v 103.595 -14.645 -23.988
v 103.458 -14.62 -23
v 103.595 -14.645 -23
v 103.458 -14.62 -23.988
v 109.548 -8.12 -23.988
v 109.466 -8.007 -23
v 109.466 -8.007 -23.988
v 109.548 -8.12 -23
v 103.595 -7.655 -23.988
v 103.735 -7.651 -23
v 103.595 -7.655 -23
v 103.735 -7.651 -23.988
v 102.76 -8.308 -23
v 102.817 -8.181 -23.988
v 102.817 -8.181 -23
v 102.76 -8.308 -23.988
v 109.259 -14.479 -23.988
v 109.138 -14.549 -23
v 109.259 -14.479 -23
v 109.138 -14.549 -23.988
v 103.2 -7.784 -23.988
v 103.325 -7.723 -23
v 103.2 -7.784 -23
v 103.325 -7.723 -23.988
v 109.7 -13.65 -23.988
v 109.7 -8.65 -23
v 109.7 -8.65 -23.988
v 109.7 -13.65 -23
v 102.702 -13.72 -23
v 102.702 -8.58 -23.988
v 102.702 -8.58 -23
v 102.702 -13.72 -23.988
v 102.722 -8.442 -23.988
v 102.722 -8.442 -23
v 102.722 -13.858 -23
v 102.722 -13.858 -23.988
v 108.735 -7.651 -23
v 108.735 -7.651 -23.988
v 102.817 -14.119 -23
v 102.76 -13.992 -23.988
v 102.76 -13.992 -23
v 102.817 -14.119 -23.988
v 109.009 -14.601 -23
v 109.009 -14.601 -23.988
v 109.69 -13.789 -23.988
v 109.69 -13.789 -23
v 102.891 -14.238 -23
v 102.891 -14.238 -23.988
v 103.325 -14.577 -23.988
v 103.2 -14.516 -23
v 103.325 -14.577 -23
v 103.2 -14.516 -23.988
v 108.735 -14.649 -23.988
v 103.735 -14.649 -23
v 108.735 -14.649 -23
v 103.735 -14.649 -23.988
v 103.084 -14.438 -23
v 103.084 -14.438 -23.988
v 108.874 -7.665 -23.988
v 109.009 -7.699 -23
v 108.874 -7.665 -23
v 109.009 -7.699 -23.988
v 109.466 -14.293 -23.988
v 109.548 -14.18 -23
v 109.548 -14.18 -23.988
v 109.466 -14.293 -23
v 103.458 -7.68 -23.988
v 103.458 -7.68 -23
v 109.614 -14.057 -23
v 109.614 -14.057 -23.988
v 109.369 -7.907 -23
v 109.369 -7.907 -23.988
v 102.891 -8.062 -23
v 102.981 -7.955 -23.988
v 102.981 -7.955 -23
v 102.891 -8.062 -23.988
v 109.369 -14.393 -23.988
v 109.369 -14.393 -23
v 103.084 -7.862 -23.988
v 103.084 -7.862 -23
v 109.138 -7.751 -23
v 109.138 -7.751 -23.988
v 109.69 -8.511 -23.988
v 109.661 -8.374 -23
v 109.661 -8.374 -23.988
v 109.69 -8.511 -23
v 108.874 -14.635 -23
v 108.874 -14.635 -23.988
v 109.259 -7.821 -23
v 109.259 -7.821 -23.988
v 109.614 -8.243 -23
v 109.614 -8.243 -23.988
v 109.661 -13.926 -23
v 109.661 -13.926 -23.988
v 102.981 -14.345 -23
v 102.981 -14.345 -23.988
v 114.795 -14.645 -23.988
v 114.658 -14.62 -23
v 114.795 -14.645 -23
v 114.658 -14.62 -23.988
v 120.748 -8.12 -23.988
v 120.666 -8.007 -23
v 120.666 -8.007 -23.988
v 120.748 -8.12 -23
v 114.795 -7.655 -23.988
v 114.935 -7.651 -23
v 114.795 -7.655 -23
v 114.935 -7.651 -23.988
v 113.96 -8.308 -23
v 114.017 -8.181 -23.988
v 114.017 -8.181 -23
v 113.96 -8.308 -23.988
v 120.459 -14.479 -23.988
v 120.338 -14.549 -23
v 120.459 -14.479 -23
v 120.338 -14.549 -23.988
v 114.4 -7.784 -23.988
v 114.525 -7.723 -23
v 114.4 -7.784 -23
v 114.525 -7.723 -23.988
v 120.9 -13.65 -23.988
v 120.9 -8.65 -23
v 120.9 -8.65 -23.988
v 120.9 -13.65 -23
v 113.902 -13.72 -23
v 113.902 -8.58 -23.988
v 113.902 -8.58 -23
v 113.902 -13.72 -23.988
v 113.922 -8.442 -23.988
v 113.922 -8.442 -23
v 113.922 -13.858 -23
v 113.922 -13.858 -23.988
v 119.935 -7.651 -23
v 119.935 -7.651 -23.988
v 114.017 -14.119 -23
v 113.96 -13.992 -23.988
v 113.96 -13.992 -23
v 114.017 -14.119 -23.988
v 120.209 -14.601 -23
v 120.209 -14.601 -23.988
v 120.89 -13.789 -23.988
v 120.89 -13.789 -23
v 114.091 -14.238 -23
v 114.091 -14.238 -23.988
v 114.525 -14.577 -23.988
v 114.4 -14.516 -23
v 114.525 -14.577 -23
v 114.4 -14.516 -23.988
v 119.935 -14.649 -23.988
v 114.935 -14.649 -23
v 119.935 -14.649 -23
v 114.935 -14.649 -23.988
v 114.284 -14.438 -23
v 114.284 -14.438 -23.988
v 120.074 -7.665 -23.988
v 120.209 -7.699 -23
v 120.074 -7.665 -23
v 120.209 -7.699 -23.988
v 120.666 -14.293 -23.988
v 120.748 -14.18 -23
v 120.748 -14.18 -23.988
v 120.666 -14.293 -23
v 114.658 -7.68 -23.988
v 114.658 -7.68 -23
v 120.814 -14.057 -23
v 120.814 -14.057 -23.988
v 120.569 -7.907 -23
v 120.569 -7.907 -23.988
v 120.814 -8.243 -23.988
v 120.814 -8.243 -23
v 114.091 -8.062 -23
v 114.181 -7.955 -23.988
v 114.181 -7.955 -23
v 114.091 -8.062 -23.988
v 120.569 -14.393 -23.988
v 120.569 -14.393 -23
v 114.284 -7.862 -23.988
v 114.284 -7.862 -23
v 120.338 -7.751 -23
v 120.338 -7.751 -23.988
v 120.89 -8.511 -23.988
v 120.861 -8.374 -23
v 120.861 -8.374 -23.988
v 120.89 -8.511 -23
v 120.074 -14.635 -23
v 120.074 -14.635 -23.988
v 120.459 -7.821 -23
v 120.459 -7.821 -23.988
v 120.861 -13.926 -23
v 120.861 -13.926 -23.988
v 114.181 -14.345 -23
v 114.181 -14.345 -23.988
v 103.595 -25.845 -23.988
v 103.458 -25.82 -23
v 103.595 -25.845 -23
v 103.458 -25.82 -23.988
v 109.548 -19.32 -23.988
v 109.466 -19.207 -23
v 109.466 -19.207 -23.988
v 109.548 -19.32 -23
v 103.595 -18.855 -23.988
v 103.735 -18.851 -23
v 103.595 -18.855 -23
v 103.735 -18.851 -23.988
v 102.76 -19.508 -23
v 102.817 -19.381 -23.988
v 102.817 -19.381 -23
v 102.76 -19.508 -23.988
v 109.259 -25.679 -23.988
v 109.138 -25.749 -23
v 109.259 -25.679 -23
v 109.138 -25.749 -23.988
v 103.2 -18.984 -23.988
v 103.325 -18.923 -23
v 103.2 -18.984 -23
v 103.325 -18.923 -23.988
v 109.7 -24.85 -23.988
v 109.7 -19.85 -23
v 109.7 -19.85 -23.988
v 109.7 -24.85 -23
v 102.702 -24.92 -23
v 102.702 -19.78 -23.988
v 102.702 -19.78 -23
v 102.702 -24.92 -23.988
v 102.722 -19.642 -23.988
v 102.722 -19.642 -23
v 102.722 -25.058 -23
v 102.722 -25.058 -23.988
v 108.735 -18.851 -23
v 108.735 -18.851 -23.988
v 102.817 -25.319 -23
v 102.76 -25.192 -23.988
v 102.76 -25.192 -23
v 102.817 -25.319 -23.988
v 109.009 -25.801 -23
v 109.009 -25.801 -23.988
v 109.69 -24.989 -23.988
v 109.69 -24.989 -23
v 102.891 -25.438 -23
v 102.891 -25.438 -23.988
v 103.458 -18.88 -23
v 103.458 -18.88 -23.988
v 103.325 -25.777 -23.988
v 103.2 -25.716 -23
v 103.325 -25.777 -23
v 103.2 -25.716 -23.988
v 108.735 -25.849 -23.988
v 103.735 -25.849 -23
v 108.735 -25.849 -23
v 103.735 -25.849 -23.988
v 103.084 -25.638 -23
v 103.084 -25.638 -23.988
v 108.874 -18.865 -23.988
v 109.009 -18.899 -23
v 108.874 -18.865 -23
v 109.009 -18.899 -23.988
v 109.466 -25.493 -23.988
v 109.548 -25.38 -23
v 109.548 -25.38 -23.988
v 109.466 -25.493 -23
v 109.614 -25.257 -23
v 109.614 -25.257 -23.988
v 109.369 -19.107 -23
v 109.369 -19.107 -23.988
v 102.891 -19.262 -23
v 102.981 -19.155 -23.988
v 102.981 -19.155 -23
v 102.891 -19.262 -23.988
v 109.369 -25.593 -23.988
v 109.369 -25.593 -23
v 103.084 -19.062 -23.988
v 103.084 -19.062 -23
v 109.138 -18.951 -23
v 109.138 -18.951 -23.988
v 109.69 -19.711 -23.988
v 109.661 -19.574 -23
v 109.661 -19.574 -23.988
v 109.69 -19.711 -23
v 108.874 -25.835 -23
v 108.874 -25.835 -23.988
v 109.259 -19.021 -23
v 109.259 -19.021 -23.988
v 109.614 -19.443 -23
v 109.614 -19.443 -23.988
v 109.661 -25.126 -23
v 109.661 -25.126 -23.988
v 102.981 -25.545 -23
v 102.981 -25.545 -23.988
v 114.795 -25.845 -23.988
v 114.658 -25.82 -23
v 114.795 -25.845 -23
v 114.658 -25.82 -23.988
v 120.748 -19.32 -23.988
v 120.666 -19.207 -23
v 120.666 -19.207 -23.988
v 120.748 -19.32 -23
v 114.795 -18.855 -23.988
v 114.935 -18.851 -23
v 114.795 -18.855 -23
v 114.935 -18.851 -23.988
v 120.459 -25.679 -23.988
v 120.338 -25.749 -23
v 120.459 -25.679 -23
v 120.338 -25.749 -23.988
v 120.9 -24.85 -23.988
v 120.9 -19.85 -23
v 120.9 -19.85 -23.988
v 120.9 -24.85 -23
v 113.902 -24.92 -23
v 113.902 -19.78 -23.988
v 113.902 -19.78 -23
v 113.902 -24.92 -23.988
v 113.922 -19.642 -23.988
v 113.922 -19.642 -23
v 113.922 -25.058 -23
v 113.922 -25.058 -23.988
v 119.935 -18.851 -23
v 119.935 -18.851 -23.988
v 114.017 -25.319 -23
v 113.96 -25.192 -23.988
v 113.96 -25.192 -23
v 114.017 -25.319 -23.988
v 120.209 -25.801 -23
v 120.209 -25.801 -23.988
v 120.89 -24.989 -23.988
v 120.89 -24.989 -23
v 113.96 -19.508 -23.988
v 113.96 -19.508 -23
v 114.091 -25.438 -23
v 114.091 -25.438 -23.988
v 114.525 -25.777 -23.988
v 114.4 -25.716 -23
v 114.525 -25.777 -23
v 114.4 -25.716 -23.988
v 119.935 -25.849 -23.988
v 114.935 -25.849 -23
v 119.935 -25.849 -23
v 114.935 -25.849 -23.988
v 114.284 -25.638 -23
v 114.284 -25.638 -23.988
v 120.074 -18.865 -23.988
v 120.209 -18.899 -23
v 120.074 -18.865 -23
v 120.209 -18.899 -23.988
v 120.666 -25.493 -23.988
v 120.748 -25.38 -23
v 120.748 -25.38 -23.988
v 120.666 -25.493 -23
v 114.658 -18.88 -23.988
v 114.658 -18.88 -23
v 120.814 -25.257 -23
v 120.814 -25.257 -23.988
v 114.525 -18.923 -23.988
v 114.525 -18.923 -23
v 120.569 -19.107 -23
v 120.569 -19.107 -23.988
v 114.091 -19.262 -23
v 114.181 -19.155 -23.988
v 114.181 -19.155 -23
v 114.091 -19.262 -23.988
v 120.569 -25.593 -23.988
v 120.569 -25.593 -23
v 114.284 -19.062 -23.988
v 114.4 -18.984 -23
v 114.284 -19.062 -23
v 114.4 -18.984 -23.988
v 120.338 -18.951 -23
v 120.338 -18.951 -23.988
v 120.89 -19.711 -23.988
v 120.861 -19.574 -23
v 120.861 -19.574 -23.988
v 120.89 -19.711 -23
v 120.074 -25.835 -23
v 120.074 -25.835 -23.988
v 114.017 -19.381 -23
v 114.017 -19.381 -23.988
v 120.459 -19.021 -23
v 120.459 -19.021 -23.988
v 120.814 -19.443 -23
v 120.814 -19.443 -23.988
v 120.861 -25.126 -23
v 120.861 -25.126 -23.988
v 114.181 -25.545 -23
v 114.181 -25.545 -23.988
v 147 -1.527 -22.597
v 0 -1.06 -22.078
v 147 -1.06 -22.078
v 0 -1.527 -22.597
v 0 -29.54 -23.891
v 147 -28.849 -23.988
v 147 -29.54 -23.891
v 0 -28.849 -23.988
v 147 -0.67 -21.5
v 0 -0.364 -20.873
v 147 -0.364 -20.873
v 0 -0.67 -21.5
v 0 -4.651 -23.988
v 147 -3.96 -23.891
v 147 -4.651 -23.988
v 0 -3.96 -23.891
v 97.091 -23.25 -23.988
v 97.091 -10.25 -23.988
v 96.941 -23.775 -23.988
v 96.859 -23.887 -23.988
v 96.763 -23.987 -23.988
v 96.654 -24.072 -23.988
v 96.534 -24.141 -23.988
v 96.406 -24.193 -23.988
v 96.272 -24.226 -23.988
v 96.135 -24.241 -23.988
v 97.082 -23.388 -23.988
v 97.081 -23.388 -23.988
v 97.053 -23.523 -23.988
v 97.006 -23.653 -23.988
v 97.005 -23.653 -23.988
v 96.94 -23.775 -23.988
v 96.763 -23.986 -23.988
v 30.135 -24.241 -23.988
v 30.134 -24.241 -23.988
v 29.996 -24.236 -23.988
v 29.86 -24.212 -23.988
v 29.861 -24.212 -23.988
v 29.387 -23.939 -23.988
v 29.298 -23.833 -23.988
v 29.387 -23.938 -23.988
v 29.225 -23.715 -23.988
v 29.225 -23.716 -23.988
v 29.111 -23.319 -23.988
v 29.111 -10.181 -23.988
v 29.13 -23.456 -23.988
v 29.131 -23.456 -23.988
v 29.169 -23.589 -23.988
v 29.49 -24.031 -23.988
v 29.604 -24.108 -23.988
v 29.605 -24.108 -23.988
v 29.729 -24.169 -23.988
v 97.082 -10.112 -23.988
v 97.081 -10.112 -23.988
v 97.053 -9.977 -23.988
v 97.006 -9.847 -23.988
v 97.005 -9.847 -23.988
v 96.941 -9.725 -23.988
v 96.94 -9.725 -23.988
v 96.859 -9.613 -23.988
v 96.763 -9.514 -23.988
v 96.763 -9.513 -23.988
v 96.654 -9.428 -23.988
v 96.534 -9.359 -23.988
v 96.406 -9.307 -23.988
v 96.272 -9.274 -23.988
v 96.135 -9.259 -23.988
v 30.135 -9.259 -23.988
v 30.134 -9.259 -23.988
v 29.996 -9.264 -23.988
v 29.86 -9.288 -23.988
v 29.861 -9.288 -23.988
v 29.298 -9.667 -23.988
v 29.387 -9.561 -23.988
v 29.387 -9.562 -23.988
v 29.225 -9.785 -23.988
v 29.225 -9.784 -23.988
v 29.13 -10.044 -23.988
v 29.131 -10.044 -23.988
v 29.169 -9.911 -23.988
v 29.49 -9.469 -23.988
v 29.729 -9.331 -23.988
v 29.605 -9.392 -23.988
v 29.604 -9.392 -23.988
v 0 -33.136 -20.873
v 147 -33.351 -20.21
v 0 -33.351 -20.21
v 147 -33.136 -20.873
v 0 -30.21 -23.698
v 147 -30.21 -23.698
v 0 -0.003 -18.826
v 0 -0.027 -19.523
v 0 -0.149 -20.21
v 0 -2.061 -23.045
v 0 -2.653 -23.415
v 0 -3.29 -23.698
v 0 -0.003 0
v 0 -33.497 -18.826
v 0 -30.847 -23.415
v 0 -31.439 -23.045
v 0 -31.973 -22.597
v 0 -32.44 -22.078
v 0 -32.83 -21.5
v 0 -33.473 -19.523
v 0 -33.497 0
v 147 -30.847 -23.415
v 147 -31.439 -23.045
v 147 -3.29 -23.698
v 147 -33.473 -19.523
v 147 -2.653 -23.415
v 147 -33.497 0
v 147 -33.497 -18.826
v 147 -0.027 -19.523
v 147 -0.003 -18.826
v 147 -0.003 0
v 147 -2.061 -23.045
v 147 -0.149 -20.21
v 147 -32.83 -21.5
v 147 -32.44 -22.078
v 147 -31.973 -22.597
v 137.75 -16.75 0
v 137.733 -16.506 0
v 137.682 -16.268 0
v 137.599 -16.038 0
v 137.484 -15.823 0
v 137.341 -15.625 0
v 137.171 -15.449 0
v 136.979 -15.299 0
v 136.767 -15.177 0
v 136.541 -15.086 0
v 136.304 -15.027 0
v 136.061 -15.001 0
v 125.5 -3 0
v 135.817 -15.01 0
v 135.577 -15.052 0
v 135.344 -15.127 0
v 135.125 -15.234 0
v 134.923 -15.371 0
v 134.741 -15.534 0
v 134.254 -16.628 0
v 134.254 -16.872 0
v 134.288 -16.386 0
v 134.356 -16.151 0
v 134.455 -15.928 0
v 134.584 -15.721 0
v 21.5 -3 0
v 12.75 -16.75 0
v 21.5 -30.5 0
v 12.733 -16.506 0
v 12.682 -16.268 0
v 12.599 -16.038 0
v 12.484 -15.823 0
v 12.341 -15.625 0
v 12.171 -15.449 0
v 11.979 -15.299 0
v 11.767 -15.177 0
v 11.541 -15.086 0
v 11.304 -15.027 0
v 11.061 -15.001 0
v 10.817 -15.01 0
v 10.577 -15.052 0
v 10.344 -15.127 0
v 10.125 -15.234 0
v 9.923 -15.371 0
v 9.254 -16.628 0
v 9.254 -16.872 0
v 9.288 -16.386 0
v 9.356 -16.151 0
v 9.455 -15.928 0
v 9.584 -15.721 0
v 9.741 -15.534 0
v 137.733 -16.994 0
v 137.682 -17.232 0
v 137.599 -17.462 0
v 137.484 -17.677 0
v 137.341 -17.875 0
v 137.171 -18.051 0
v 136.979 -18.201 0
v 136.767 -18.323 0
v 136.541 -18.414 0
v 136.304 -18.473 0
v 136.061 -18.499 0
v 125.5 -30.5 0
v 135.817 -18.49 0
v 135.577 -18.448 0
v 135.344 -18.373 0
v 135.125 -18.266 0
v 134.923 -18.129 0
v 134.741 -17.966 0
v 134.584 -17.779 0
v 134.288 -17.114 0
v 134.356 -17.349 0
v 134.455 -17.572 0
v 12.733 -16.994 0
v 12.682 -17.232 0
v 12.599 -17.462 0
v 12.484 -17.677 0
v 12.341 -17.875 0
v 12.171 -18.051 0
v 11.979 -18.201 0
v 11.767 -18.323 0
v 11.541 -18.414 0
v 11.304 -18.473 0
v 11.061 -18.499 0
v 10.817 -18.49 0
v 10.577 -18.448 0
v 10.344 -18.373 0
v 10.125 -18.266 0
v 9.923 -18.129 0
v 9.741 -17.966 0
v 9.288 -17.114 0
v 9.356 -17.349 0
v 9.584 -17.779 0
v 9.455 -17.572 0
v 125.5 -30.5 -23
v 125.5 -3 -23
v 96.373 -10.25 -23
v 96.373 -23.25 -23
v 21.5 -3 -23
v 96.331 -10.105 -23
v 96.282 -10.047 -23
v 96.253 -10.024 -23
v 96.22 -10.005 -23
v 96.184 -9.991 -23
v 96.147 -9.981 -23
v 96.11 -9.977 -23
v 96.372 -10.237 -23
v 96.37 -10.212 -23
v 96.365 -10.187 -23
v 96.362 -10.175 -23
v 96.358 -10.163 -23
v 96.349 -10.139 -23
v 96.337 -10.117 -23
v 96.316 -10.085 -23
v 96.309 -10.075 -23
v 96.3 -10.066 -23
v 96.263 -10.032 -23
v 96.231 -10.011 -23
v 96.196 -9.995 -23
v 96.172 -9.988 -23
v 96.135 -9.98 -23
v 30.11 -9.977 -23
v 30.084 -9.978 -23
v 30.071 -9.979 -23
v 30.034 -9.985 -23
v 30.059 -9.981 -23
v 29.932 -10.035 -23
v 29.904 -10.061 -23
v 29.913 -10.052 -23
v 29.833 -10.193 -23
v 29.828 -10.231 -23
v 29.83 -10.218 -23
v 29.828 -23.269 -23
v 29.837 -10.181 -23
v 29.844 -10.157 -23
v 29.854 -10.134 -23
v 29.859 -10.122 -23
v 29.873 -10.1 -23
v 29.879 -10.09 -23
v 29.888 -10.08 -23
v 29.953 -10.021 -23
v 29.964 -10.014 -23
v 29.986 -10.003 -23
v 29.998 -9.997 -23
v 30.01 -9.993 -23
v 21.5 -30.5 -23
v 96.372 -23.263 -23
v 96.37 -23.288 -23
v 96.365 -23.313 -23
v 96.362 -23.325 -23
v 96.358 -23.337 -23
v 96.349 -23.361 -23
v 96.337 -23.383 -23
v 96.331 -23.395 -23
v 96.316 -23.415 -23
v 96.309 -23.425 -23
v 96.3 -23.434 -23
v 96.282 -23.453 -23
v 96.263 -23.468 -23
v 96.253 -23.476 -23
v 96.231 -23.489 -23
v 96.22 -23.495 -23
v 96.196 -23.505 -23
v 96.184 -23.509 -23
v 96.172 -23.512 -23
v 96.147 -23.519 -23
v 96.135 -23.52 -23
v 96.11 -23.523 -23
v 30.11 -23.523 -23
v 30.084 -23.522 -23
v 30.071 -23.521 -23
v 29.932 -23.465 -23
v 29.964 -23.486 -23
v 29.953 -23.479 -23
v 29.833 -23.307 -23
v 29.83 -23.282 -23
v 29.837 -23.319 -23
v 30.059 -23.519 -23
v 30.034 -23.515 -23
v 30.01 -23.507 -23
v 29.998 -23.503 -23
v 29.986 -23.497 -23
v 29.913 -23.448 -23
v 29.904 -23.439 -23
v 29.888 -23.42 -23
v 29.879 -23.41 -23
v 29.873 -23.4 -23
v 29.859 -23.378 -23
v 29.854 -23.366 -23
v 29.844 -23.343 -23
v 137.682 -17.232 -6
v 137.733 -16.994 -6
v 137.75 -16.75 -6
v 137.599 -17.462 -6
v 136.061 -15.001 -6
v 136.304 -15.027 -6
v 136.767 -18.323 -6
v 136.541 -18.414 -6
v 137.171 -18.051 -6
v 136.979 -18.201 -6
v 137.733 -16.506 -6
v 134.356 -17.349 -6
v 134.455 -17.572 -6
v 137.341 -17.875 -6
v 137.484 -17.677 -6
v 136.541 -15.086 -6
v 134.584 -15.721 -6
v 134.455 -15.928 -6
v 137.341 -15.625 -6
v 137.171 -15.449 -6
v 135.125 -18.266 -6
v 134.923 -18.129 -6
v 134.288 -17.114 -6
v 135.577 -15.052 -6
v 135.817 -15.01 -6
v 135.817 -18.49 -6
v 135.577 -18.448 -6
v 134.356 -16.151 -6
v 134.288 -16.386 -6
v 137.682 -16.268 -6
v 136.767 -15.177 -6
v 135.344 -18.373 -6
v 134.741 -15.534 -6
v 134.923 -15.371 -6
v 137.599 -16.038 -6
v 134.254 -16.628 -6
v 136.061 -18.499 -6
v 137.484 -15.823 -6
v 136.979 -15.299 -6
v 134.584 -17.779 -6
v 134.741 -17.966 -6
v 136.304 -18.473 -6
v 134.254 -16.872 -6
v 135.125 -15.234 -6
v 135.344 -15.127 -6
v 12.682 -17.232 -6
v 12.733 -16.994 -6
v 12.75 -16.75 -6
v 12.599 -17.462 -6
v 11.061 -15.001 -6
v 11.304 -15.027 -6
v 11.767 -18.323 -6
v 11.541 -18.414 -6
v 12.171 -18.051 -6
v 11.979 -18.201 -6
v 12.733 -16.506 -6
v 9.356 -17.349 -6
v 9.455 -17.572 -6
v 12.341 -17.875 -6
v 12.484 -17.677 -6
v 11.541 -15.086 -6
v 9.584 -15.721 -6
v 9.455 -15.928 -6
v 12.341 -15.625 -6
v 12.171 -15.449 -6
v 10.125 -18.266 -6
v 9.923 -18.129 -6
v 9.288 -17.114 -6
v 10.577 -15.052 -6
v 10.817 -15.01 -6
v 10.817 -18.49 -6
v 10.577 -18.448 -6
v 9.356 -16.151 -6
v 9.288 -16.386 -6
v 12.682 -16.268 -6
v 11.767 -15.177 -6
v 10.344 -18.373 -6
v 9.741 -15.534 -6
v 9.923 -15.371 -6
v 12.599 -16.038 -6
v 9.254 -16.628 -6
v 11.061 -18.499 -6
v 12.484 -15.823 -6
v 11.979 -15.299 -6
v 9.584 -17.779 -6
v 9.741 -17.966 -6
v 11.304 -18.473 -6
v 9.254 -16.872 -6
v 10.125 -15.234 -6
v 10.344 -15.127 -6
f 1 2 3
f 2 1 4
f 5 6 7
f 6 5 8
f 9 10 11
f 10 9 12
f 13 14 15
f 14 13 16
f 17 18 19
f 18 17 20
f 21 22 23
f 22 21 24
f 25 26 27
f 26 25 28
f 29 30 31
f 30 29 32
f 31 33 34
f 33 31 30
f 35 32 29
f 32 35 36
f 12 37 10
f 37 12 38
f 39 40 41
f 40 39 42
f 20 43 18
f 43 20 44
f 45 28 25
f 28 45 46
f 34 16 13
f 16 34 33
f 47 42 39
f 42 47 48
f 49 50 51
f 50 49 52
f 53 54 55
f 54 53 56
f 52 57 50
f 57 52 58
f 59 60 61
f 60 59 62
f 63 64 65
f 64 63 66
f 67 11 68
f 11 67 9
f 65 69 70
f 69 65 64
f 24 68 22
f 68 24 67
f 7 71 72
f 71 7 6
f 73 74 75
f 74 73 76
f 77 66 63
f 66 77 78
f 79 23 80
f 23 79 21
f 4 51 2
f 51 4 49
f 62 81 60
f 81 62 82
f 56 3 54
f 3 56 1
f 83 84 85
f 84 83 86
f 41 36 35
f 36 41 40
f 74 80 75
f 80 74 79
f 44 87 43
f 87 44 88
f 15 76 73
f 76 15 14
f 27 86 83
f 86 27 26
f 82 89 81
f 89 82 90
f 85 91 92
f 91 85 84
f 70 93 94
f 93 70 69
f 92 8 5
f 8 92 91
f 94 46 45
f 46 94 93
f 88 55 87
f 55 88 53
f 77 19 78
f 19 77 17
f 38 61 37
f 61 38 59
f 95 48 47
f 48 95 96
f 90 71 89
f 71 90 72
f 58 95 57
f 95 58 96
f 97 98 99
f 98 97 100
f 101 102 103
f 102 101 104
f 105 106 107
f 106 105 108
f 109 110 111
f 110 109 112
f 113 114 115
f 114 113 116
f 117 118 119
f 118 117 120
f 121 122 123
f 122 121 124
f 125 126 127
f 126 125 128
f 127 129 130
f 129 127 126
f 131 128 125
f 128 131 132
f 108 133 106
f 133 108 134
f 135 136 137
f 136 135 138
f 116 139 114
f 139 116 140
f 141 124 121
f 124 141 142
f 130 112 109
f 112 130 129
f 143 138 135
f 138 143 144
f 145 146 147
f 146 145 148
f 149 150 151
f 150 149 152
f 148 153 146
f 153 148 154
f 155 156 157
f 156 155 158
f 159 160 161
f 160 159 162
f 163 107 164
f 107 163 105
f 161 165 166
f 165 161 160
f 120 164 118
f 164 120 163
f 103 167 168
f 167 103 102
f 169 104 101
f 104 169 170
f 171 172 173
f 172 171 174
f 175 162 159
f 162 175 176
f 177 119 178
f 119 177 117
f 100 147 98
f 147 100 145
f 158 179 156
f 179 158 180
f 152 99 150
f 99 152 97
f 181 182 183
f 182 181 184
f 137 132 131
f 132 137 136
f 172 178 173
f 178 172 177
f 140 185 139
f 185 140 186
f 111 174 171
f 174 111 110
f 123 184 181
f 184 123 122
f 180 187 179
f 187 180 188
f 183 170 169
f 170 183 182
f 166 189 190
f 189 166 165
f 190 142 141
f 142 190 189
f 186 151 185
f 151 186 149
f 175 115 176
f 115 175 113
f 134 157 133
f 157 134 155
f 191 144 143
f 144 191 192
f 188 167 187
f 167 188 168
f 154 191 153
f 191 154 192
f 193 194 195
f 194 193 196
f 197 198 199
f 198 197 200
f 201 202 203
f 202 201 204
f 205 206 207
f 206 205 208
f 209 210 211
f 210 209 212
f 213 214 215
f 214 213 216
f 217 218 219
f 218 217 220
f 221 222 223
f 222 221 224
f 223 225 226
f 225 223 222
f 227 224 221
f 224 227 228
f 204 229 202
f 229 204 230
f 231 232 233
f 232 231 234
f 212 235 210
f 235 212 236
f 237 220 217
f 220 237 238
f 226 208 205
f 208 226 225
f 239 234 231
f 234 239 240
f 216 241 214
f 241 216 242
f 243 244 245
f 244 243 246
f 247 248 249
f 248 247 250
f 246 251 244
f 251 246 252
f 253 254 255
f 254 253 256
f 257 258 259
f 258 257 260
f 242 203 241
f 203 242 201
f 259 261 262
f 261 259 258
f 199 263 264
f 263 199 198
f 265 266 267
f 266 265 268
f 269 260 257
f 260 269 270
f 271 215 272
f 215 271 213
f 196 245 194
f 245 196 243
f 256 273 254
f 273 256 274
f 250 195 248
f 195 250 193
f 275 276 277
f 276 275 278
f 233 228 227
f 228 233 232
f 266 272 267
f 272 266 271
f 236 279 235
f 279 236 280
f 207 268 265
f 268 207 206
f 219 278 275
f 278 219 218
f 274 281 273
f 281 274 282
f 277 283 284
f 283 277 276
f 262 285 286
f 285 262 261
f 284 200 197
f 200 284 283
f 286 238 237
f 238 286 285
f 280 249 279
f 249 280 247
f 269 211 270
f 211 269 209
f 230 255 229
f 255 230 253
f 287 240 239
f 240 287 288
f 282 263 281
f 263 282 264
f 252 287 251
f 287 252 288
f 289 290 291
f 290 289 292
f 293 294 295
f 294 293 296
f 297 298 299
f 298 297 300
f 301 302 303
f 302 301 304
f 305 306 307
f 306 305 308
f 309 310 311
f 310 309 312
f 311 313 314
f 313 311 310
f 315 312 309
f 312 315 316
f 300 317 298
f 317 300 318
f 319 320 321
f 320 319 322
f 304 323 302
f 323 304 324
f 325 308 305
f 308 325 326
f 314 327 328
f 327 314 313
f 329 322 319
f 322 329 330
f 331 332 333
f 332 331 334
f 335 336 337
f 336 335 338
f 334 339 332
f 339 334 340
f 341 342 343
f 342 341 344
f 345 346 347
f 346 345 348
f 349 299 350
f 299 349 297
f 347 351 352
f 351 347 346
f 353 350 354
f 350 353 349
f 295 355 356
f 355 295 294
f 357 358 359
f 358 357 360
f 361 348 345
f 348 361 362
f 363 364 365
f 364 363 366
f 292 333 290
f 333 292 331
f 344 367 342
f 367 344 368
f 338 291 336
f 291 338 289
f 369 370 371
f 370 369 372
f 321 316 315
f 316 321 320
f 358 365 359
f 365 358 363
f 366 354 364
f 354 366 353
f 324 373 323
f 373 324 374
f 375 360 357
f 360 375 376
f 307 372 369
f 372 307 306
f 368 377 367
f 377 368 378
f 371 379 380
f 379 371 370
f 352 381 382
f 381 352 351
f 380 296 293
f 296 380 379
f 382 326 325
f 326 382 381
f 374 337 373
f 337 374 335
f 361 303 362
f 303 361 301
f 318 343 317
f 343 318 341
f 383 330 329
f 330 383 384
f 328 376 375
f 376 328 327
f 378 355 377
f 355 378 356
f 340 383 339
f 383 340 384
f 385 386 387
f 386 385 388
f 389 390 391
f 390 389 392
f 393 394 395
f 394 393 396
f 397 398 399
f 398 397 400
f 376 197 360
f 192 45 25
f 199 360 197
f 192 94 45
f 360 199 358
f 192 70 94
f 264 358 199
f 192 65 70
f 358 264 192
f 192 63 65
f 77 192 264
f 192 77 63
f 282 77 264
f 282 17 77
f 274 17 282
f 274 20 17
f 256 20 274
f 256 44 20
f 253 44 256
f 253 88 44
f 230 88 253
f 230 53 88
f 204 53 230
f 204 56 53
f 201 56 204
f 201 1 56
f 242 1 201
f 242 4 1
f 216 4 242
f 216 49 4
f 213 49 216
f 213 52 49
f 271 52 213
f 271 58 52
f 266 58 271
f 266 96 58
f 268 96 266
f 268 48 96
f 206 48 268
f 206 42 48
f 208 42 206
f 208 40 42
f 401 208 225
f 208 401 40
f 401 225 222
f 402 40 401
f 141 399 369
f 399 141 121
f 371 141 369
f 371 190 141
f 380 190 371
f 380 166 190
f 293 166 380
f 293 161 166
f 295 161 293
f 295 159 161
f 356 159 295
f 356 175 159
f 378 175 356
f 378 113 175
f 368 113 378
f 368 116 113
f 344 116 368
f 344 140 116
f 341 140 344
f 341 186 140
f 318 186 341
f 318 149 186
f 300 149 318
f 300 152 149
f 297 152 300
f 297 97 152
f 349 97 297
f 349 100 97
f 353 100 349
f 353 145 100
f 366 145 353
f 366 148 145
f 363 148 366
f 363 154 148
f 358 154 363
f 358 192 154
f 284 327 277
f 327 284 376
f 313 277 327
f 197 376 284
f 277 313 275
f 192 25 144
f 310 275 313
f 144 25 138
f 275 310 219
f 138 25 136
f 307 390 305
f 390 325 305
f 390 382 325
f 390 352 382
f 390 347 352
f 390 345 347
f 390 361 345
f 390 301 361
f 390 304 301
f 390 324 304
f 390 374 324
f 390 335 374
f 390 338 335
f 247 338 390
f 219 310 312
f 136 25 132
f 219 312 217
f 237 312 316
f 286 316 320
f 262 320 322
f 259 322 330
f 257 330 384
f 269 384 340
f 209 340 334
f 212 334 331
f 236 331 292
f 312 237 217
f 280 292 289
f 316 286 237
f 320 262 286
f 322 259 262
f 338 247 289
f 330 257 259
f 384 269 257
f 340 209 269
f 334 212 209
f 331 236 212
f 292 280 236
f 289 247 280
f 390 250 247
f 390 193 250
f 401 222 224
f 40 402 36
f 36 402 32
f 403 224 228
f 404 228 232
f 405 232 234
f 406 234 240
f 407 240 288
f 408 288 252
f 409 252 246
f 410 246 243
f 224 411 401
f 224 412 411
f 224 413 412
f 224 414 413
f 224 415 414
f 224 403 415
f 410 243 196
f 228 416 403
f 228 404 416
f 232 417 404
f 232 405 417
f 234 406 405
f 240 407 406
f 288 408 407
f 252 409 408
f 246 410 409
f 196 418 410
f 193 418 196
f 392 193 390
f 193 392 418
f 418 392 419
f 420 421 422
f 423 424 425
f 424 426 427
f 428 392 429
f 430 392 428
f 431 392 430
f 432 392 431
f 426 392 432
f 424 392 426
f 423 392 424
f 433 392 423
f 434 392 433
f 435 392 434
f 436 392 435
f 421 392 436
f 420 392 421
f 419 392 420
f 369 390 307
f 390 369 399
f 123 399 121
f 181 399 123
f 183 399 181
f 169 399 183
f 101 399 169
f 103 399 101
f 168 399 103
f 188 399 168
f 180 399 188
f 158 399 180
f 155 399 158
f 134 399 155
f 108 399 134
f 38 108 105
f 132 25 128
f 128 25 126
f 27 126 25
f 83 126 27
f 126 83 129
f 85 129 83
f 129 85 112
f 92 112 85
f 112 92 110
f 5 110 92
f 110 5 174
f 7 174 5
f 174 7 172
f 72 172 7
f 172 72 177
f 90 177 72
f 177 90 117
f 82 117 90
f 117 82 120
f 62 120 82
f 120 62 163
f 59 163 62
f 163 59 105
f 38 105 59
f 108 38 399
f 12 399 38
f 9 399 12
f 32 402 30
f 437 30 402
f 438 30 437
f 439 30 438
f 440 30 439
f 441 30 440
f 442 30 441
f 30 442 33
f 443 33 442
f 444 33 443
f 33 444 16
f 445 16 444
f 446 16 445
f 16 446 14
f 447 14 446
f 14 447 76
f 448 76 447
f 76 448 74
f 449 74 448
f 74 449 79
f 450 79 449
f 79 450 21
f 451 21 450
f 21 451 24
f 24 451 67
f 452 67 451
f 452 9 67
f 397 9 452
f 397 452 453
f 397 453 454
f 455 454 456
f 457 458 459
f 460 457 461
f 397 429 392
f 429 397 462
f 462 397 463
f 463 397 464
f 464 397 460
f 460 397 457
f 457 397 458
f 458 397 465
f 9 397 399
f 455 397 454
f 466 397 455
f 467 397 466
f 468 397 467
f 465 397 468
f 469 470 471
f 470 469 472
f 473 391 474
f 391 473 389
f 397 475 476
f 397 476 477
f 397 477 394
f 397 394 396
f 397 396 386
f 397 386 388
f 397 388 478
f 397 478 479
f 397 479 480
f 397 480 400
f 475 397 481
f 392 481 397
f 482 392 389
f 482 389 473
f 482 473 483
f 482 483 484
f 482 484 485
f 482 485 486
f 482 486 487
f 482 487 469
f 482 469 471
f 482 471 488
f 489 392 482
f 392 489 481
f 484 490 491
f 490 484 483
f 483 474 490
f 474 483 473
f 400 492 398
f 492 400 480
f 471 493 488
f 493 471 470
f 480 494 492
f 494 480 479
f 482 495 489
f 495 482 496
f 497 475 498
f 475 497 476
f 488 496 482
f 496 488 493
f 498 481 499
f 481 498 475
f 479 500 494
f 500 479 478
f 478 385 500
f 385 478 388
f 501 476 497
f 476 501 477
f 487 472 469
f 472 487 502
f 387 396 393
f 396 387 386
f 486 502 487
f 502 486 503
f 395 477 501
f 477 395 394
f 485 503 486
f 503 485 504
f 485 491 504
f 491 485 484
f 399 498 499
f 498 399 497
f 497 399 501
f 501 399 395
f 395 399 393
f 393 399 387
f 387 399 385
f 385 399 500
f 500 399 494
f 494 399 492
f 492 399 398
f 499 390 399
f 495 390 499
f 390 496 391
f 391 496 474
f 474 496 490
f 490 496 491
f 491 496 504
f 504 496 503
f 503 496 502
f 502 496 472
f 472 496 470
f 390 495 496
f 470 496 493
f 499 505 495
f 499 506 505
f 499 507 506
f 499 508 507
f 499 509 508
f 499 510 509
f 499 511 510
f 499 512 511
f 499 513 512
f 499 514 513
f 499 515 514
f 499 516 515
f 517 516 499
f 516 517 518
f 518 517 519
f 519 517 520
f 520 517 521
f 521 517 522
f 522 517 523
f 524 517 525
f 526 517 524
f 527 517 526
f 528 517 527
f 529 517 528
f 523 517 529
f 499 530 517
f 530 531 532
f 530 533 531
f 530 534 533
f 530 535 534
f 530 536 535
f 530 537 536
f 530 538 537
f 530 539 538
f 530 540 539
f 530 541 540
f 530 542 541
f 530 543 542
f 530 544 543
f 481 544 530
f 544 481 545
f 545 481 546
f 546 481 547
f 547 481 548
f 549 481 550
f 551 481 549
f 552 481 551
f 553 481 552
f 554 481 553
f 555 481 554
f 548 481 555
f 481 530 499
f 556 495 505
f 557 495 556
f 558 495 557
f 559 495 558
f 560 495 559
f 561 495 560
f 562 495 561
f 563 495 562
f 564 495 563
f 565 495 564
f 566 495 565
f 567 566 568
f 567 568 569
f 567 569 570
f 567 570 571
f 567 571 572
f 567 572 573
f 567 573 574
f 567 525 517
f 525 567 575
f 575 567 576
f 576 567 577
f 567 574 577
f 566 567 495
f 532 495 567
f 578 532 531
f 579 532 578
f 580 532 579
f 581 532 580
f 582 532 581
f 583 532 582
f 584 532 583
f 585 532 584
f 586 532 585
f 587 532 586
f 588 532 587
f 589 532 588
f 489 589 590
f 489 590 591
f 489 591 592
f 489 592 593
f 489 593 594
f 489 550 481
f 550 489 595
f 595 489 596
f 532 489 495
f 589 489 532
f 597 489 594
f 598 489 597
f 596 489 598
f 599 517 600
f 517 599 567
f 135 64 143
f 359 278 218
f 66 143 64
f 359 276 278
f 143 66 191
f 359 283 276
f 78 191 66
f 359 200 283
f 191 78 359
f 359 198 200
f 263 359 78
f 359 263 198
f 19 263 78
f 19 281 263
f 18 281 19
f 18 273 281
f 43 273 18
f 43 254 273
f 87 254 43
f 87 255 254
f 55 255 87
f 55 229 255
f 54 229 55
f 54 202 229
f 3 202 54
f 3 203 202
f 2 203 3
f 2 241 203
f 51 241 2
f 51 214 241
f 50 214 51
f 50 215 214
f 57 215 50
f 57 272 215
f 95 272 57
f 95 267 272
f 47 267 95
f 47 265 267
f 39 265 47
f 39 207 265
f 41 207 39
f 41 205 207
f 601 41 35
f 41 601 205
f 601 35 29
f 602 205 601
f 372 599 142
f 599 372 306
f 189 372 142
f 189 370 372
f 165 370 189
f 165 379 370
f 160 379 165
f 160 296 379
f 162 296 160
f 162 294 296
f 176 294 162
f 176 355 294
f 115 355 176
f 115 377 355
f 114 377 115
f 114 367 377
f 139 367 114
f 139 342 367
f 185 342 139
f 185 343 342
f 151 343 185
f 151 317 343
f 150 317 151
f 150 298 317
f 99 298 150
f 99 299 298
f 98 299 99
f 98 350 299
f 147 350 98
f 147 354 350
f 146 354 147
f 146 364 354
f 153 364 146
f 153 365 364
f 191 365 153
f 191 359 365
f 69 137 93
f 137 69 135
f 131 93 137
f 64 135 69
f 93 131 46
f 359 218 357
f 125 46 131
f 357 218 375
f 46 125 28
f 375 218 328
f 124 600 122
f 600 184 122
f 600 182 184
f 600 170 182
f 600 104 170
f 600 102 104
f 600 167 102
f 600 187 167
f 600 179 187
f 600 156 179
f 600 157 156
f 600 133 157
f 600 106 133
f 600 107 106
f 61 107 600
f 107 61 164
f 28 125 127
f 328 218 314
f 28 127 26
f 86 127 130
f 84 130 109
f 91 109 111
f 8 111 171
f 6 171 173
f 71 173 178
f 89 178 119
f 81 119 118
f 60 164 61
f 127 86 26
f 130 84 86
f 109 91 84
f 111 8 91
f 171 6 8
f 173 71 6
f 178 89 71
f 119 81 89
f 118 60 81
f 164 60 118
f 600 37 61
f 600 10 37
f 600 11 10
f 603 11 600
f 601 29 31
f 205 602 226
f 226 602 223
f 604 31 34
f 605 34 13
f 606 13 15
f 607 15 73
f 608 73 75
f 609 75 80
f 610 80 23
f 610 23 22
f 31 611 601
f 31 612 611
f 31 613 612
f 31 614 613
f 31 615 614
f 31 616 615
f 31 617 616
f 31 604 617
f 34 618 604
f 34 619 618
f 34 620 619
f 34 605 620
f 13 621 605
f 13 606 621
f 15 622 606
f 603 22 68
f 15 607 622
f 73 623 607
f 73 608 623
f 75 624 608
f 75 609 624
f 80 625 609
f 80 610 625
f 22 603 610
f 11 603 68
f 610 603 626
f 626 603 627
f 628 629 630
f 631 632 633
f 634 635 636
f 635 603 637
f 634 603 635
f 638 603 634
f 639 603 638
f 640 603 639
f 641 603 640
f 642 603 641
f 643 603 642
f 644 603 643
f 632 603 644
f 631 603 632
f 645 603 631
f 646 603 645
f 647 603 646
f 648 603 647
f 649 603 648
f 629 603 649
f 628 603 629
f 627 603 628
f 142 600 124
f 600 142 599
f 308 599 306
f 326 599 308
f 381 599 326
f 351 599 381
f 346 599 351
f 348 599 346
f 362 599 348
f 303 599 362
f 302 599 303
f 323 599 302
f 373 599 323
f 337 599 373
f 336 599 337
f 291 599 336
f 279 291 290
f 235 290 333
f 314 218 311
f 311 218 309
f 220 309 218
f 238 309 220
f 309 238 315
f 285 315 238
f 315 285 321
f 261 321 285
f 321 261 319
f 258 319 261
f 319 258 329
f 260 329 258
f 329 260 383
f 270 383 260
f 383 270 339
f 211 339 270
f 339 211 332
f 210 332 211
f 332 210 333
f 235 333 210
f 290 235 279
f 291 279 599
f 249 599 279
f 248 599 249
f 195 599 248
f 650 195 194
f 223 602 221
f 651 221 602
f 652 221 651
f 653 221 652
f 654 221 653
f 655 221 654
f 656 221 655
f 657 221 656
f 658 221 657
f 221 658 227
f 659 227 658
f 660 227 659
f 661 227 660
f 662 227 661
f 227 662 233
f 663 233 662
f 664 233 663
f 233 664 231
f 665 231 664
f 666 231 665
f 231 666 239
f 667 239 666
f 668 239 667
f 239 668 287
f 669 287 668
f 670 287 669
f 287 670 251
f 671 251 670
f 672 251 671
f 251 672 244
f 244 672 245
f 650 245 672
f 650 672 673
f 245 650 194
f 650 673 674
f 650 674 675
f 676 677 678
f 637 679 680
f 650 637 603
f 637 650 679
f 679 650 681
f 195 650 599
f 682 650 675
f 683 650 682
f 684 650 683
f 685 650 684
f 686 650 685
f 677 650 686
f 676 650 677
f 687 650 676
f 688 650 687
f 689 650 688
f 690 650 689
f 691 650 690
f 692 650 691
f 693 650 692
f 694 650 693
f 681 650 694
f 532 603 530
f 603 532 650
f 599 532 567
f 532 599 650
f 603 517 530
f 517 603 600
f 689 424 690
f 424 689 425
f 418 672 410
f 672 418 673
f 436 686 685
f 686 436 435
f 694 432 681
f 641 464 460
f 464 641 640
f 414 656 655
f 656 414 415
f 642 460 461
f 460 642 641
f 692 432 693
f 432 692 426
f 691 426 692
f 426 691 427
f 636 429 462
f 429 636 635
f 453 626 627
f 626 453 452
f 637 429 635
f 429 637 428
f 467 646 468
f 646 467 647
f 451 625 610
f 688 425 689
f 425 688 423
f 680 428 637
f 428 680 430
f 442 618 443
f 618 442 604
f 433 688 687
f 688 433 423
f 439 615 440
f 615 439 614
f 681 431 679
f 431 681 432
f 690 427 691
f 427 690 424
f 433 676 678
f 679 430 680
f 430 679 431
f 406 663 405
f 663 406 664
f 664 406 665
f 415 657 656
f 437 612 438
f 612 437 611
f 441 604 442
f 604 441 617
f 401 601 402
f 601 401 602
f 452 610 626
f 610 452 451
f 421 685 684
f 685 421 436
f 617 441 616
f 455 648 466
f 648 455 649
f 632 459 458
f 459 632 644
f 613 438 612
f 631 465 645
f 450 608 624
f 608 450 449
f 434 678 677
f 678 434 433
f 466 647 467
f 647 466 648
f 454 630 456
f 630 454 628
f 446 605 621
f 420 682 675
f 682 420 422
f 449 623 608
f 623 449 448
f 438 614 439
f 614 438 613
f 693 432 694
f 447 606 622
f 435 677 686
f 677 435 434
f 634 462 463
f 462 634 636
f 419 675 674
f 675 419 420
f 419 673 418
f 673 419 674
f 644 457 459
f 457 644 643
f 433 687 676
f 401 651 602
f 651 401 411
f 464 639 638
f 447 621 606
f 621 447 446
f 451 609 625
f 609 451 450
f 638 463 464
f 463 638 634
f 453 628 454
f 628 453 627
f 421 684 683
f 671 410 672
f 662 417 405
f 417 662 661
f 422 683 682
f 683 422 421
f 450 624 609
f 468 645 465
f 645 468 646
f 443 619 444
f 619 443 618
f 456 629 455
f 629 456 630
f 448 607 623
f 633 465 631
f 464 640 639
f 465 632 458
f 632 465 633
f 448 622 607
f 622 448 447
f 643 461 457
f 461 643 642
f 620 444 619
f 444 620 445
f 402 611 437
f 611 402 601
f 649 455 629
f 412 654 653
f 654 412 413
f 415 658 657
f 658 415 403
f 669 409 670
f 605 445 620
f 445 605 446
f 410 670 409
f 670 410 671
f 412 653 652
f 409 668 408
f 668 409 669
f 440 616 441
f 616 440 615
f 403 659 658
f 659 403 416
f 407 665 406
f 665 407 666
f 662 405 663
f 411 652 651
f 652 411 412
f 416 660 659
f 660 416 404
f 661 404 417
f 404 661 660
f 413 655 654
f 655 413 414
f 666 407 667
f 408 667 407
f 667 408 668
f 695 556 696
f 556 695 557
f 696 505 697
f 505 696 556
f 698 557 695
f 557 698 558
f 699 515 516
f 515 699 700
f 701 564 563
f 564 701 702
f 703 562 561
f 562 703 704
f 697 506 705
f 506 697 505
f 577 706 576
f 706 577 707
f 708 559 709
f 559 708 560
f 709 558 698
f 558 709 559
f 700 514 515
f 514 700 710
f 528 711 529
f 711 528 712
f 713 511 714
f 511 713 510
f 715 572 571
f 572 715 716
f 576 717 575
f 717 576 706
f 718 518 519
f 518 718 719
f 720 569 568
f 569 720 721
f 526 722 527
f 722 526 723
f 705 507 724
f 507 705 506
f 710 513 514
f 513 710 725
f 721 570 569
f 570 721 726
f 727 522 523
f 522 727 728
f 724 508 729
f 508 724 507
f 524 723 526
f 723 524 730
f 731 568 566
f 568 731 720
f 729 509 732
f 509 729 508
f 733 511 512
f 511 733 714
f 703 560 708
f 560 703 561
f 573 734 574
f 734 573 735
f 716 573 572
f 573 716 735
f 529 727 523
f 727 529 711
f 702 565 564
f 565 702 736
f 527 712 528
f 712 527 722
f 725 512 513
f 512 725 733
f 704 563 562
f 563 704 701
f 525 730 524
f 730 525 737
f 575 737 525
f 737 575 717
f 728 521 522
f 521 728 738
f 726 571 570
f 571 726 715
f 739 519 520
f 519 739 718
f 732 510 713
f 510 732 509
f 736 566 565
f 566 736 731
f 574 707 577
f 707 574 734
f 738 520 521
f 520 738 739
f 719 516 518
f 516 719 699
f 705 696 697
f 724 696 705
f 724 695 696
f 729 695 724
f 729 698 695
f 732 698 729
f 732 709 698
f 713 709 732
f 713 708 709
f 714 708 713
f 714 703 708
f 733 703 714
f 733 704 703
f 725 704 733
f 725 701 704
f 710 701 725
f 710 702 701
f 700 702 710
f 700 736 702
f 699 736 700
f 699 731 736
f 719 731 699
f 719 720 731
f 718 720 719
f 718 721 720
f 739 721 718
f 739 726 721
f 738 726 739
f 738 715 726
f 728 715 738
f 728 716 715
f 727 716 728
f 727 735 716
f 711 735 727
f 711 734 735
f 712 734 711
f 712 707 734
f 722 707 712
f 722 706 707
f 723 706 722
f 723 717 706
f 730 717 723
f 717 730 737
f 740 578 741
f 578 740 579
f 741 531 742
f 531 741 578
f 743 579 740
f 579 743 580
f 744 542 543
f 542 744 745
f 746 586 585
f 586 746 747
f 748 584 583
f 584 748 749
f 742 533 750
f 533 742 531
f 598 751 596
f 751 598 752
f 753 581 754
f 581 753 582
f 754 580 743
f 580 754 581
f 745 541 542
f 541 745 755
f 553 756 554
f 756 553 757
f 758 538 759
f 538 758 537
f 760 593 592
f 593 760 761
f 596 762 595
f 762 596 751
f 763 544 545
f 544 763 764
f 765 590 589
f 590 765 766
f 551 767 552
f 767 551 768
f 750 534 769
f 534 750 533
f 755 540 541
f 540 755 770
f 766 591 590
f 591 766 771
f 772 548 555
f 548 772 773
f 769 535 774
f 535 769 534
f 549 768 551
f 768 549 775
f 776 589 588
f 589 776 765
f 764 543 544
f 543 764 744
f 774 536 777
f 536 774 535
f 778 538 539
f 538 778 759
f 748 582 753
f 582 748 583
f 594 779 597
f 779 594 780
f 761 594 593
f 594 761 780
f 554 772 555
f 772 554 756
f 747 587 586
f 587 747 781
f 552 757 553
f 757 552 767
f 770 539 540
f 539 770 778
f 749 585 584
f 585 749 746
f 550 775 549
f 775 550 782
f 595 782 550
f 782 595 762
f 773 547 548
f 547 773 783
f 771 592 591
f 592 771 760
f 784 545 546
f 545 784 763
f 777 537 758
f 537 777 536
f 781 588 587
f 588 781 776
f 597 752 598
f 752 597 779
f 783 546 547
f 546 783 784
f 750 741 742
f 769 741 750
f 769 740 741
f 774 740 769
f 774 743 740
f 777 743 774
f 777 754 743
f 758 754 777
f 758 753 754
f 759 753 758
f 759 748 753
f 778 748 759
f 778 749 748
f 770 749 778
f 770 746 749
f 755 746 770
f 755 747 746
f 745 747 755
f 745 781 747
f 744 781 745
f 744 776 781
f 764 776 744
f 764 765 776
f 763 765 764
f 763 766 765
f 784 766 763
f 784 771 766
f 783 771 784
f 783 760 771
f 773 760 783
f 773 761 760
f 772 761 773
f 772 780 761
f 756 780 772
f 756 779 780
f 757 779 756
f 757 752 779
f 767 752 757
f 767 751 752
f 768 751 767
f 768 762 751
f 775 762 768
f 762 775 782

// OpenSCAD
screen_x=66;
screen_y=13;
screen_gap_x=6.6;
screen_corner=1;
button=7;
//distance between buttons
button_gap=4.2;
button_corner=1;
$fn=45;

pcb_x=104;
pcb_y=27.5;
pcb_z=20;

gap_y=3;
gap_front=1;
gap_back=3;

total_x=147;
total_y=gap_y*2+pcb_y;
total_z=pcb_z+gap_back+gap_front;

wing_x=(total_x-pcb_x)/2;

front_corner=5;

pad=0.1;
padd=pad*2;

screw=3.5;
screw_h=6;
screw_gap=125;

console_x=screen_x+screen_gap_x+button*2+button_gap;
console_to_end=(total_x-console_x)/2;

fuck_it=2;

rotate([180,0,0])
difference() {
    translate([0,front_corner,0])
    minkowski() {
        cube([total_x/2,total_y-front_corner*2,total_z-front_corner]);
        rotate([0,90,0])
        cylinder(r=front_corner,h=total_x/2);

    }
    //cut off bottom
    translate([-pad,-pad,-front_corner-pad])
    cube([total_x+padd,total_y+padd,front_corner+pad]);

    //hole for PCB
    translate([wing_x,gap_y,-pad])
    cube([pcb_x,pcb_y,pcb_z+gap_back+pad]);

    //hole for screen
    translate([console_to_end+fuck_it,(total_y-screen_y)/2,pcb_z+gap_back-pad])
    minkowski() {
        cube([screen_x,screen_y,gap_front+padd]);
        cylinder(r1=padd,r2=gap_front,h=gap_front+pad);
    }

    translate([console_to_end+screen_x+screen_gap_x+fuck_it,(total_y-button*2-button_gap)/2,pcb_z+gap_back-pad])
    buttons();

    screw_hole(1);
    screw_hole(-1);
}

module screw_hole(x) {
    translate([total_x/2+x*screw_gap/2,total_y/2,-pad])
    cylinder(d=screw,h=screw_h+pad);
}

module buttons() {
    button_hole(0,0);
    button_hole(button+button_gap,0);
    button_hole(0,button+button_gap);
    button_hole(button+button_gap,button+button_gap);
}

module button_hole(x,y) {
    translate([button_corner+x,button_corner+y,0])
    minkowski() {
        cube([button-button_corner*2,button-button_corner*2,gap_front+padd]);
        cylinder(r=button_corner,h=gap_front);
    }

}
